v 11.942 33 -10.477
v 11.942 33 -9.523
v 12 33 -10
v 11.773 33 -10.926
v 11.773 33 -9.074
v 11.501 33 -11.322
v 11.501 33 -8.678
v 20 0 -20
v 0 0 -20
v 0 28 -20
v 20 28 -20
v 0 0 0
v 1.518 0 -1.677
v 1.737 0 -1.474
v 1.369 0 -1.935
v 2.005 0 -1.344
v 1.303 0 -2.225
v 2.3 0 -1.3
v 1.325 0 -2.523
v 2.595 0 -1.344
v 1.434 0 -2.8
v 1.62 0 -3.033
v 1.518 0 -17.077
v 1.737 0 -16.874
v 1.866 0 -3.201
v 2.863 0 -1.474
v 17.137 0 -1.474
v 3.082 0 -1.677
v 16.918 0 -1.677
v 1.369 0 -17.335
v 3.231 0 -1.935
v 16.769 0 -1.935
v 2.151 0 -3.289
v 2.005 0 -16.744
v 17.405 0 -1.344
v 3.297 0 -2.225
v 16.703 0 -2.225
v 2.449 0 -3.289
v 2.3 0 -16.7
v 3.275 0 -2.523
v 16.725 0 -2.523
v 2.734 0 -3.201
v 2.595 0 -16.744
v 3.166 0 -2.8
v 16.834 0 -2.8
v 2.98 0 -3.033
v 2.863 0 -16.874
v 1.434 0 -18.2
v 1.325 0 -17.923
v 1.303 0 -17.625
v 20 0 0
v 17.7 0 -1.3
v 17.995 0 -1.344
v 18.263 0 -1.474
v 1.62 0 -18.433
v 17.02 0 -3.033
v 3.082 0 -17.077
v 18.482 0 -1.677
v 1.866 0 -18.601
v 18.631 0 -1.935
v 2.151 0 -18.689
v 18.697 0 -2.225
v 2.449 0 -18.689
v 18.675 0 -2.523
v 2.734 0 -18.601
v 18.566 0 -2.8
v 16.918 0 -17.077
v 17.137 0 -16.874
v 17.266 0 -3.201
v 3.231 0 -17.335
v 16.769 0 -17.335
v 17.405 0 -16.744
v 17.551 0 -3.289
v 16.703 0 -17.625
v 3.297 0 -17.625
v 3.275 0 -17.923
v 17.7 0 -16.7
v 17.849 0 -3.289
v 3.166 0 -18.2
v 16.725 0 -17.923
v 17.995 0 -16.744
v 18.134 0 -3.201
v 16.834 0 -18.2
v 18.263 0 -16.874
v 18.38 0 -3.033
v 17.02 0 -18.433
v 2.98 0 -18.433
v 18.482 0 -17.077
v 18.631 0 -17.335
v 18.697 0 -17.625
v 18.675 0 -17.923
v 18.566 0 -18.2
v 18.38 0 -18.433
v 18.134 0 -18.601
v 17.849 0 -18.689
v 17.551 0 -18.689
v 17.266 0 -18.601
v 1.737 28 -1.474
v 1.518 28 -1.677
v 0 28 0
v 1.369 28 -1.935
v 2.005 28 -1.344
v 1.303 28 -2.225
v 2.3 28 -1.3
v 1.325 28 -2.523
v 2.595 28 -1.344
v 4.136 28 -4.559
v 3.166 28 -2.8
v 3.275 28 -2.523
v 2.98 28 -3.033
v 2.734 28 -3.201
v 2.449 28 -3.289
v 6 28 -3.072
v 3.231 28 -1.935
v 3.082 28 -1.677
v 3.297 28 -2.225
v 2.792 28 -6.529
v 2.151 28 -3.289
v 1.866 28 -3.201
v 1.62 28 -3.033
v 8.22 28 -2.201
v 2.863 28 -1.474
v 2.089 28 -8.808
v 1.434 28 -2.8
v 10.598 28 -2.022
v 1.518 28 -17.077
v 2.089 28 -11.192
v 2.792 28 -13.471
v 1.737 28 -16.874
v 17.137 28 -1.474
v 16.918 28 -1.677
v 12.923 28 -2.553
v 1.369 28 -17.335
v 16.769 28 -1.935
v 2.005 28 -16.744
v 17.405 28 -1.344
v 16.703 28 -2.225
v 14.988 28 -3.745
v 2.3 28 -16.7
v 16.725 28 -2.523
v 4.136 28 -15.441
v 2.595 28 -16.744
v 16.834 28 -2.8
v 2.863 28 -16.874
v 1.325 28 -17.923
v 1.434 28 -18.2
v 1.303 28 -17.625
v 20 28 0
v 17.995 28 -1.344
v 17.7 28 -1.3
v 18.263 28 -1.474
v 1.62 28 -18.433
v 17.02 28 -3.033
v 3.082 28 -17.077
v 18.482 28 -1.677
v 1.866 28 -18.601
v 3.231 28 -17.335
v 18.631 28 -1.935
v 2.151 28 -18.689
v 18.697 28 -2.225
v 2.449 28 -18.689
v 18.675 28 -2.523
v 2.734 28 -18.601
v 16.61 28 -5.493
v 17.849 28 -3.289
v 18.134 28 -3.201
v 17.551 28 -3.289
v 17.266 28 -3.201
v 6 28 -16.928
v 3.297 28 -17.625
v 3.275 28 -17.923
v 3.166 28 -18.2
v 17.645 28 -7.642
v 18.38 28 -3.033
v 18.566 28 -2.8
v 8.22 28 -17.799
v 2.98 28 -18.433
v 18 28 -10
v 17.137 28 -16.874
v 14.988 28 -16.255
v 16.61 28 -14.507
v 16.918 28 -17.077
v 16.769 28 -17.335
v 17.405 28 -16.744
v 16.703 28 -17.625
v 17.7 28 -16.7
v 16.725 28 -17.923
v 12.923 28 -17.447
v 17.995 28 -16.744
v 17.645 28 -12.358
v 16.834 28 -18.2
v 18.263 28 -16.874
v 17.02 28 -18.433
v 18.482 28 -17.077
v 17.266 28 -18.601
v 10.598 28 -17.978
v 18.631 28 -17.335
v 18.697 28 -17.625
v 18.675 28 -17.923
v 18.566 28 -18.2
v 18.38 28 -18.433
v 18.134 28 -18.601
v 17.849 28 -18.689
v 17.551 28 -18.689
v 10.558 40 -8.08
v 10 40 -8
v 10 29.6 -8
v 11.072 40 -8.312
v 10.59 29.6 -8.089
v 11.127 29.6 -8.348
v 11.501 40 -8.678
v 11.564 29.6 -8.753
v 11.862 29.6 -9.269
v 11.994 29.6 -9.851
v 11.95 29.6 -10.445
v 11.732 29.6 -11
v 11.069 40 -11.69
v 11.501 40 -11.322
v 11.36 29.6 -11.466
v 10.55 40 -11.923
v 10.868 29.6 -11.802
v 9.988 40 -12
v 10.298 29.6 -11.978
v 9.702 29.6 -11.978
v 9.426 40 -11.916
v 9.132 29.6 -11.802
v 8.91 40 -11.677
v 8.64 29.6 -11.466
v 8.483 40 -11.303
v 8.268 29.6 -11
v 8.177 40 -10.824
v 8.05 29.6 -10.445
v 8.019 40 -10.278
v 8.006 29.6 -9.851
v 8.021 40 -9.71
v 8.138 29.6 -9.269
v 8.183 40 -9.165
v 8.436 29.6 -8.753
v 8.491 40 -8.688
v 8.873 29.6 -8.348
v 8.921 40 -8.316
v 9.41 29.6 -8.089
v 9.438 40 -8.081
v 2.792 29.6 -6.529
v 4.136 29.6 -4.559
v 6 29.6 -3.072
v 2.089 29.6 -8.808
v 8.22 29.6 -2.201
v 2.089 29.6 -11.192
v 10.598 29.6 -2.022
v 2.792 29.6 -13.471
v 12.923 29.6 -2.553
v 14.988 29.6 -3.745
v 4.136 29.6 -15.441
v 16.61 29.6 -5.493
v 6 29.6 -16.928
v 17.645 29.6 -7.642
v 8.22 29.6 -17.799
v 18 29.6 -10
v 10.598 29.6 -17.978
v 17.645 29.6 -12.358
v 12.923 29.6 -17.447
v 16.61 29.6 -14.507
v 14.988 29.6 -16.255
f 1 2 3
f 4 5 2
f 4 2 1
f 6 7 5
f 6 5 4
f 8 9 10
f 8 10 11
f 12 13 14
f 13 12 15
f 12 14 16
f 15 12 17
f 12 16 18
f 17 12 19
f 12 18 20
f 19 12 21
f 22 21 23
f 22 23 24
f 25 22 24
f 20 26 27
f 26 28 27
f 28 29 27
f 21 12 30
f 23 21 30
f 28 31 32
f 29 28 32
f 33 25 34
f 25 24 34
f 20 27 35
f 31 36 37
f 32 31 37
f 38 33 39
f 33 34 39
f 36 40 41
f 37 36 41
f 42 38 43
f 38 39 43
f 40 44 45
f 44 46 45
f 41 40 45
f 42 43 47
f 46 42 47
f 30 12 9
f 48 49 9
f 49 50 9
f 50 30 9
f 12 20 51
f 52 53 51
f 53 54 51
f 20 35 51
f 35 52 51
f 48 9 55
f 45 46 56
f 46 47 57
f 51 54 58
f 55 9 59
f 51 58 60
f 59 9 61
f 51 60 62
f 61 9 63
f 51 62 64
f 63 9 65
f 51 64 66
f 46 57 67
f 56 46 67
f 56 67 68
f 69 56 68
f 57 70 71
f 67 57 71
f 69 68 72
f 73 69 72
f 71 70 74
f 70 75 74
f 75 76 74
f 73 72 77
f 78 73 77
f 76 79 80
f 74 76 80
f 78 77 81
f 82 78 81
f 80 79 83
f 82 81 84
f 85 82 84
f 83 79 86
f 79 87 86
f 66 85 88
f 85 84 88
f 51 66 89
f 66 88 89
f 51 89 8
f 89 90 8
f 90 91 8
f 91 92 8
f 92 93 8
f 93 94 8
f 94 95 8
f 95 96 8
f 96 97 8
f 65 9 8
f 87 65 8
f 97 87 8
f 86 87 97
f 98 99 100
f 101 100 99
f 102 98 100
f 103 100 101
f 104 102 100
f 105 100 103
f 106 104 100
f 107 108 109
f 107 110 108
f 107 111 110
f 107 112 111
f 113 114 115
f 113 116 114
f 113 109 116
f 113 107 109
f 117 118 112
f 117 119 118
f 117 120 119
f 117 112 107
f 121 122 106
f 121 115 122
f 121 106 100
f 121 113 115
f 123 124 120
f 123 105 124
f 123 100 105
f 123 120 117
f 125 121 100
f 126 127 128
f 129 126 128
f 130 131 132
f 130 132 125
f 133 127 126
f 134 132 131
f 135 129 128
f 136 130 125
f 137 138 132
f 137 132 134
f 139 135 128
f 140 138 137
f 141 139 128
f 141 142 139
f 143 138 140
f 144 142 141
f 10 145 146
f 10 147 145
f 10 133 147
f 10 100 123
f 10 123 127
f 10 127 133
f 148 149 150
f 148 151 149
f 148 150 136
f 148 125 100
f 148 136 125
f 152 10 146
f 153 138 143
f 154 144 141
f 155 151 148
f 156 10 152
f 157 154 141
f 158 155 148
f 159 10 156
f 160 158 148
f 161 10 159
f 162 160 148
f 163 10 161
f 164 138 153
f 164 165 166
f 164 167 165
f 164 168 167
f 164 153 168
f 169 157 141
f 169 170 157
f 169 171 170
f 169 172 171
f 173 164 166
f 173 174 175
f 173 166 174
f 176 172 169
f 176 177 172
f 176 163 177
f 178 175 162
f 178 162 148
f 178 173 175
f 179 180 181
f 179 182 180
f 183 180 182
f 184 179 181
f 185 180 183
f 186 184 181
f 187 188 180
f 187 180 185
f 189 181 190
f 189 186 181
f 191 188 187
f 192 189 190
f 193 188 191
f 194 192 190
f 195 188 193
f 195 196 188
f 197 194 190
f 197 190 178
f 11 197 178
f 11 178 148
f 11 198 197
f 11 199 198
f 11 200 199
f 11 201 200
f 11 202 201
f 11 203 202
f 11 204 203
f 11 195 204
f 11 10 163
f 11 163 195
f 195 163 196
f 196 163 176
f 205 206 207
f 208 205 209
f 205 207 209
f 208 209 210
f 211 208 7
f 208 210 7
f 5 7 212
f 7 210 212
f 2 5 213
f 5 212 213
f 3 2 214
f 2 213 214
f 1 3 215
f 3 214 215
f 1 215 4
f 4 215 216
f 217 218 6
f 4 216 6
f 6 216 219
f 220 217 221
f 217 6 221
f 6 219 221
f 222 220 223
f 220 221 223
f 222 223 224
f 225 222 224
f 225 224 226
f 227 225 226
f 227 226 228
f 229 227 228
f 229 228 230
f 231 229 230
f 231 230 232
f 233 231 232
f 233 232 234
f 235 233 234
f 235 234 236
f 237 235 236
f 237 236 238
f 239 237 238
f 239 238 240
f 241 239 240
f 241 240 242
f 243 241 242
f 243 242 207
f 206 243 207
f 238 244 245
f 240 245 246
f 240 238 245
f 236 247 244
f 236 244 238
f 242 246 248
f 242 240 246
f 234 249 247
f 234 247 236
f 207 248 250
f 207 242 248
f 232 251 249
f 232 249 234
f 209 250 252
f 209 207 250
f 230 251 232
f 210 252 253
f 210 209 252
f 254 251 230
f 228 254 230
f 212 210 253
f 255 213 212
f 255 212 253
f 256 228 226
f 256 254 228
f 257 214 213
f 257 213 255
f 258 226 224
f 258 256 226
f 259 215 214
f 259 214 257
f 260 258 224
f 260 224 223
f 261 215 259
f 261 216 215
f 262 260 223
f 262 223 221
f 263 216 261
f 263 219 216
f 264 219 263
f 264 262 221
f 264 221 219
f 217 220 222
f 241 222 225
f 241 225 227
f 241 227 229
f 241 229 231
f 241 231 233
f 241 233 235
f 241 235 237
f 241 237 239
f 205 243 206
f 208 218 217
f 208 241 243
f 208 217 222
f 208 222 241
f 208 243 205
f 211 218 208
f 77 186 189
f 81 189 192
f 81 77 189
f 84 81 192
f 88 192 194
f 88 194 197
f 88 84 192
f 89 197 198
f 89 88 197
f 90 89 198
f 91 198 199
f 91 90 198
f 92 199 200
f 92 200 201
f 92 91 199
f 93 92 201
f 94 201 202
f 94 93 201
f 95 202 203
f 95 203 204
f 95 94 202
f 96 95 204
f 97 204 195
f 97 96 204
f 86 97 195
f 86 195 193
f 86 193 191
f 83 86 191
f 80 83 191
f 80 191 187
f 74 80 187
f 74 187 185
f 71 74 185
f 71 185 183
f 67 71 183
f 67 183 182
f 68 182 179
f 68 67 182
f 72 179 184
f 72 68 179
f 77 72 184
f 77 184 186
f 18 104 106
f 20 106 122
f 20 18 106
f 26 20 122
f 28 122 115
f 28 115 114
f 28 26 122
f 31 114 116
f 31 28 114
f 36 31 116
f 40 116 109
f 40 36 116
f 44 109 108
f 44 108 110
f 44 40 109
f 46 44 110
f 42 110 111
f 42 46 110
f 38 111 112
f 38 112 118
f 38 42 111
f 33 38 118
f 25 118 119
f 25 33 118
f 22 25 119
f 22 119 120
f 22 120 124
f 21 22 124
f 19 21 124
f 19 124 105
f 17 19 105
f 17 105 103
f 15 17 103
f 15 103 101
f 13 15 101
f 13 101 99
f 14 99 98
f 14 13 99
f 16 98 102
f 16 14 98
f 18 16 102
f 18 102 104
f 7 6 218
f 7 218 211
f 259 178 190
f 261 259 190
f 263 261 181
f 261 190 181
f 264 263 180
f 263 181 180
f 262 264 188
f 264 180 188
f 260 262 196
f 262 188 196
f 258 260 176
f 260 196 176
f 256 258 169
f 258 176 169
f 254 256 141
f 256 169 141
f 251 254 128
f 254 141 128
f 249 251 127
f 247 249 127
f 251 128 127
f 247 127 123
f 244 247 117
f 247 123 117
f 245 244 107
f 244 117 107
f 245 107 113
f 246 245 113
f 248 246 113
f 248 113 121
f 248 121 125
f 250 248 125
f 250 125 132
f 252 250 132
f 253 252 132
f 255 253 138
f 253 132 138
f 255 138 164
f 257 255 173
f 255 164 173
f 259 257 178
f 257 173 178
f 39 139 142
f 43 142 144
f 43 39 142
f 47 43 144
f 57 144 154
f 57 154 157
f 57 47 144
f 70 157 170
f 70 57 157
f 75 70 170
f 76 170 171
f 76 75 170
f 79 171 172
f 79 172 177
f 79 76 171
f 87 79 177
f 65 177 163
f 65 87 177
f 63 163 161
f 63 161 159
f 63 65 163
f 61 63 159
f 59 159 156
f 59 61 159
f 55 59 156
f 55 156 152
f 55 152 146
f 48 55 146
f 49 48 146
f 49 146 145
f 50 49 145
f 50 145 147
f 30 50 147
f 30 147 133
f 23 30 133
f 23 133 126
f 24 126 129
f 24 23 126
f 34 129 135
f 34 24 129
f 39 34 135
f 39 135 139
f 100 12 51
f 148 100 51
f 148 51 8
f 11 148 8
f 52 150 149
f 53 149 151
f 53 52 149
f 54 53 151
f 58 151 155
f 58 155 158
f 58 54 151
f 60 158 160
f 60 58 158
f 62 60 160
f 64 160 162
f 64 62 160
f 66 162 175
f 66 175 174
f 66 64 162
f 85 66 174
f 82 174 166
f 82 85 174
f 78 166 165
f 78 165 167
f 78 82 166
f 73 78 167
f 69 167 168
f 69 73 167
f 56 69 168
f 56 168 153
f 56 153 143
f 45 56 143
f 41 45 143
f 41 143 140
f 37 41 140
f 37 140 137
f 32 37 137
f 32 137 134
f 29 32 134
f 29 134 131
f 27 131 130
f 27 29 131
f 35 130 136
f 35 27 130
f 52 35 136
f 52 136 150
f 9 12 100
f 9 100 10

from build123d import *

# Parameters (mm, degrees)
SKETCH_1_W          = 20
SKETCH_1_H          = 20
SKETCH_1_R          = 1
EXTRUDE_1_DEPTH     = 28
EXTRUDE_2_DEPTH     = 1.6
SKETCH_3_R          = 2
EXTRUDE_3_DEPTH     = 10.4
CUT_EXTRUDE_START   = -7
CUT_EXTRUDE_4_DEPTH = 7


with BuildPart() as part:
    # 草图1 → 凸台-拉伸1 (new body)
    with BuildSketch(Plane(origin=(0, 0, 0), x_dir=(1, 0, 0), z_dir=(0, 1, 0))):
        with Locations((10, 10)):
            Rectangle(SKETCH_1_W, SKETCH_1_H)
        with Locations(Location((17.7, 2.3, 0), (0, 0, 270))):
            Circle(SKETCH_1_R, mode=Mode.SUBTRACT)
        with Locations(Location((17.7, 17.7, 0), (0, 0, 270))):
            Circle(SKETCH_1_R, mode=Mode.SUBTRACT)
        with Locations(Location((2.3, 17.7, 0), (0, 0, 270))):
            Circle(SKETCH_1_R, mode=Mode.SUBTRACT)
        with Locations(Location((2.3, 2.3, 0), (0, 0, 270))):
            Circle(SKETCH_1_R, mode=Mode.SUBTRACT)
    extrude(amount=EXTRUDE_1_DEPTH)

    # 草图2 → 凸台-拉伸2 (add)
    with BuildSketch(Plane(origin=(0, 28, 0), x_dir=(1, 0, 0), z_dir=(0, 1, 0))):
        with BuildLine():
            ThreePointArc((2, 10), (10, 2), (18, 10))
            Line((18, 10), (2, 10))
        make_face()
        with BuildLine():
            Line((2, 10), (18, 10))
            ThreePointArc((18, 10), (10, 18), (2, 10))
        make_face()
    extrude(amount=EXTRUDE_2_DEPTH)

    # 草图3 → 凸台-拉伸3 (add)
    with BuildSketch(Plane(origin=(0, 29.6, 0), x_dir=(1, 0, 0), z_dir=(0, 1, 0))):
        with Locations(Location((10, 10, 0), (0, 0, 270))):
            Circle(SKETCH_3_R)
    extrude(amount=EXTRUDE_3_DEPTH)

    # 草图4 → 切除-拉伸4 (cut)
    with BuildSketch(Plane(origin=(0, 40, 0), x_dir=(1, 0, 0), z_dir=(0, 1, 0)).offset(CUT_EXTRUDE_START)):
        with BuildLine():
            Line((11.501110762, 11.321615103), (11.501110762, 10))
            Line((11.501110762, 10), (11.501110762, 8.678384897))
            ThreePointArc((11.501110762, 8.678384897), (11.871125533, 9.293679083), (12, 10))
            ThreePointArc((12, 10), (11.871125533, 10.706320917), (11.501110762, 11.321615103))
        make_face()
    extrude(amount=CUT_EXTRUDE_4_DEPTH, mode=Mode.SUBTRACT)


solid = part.part
